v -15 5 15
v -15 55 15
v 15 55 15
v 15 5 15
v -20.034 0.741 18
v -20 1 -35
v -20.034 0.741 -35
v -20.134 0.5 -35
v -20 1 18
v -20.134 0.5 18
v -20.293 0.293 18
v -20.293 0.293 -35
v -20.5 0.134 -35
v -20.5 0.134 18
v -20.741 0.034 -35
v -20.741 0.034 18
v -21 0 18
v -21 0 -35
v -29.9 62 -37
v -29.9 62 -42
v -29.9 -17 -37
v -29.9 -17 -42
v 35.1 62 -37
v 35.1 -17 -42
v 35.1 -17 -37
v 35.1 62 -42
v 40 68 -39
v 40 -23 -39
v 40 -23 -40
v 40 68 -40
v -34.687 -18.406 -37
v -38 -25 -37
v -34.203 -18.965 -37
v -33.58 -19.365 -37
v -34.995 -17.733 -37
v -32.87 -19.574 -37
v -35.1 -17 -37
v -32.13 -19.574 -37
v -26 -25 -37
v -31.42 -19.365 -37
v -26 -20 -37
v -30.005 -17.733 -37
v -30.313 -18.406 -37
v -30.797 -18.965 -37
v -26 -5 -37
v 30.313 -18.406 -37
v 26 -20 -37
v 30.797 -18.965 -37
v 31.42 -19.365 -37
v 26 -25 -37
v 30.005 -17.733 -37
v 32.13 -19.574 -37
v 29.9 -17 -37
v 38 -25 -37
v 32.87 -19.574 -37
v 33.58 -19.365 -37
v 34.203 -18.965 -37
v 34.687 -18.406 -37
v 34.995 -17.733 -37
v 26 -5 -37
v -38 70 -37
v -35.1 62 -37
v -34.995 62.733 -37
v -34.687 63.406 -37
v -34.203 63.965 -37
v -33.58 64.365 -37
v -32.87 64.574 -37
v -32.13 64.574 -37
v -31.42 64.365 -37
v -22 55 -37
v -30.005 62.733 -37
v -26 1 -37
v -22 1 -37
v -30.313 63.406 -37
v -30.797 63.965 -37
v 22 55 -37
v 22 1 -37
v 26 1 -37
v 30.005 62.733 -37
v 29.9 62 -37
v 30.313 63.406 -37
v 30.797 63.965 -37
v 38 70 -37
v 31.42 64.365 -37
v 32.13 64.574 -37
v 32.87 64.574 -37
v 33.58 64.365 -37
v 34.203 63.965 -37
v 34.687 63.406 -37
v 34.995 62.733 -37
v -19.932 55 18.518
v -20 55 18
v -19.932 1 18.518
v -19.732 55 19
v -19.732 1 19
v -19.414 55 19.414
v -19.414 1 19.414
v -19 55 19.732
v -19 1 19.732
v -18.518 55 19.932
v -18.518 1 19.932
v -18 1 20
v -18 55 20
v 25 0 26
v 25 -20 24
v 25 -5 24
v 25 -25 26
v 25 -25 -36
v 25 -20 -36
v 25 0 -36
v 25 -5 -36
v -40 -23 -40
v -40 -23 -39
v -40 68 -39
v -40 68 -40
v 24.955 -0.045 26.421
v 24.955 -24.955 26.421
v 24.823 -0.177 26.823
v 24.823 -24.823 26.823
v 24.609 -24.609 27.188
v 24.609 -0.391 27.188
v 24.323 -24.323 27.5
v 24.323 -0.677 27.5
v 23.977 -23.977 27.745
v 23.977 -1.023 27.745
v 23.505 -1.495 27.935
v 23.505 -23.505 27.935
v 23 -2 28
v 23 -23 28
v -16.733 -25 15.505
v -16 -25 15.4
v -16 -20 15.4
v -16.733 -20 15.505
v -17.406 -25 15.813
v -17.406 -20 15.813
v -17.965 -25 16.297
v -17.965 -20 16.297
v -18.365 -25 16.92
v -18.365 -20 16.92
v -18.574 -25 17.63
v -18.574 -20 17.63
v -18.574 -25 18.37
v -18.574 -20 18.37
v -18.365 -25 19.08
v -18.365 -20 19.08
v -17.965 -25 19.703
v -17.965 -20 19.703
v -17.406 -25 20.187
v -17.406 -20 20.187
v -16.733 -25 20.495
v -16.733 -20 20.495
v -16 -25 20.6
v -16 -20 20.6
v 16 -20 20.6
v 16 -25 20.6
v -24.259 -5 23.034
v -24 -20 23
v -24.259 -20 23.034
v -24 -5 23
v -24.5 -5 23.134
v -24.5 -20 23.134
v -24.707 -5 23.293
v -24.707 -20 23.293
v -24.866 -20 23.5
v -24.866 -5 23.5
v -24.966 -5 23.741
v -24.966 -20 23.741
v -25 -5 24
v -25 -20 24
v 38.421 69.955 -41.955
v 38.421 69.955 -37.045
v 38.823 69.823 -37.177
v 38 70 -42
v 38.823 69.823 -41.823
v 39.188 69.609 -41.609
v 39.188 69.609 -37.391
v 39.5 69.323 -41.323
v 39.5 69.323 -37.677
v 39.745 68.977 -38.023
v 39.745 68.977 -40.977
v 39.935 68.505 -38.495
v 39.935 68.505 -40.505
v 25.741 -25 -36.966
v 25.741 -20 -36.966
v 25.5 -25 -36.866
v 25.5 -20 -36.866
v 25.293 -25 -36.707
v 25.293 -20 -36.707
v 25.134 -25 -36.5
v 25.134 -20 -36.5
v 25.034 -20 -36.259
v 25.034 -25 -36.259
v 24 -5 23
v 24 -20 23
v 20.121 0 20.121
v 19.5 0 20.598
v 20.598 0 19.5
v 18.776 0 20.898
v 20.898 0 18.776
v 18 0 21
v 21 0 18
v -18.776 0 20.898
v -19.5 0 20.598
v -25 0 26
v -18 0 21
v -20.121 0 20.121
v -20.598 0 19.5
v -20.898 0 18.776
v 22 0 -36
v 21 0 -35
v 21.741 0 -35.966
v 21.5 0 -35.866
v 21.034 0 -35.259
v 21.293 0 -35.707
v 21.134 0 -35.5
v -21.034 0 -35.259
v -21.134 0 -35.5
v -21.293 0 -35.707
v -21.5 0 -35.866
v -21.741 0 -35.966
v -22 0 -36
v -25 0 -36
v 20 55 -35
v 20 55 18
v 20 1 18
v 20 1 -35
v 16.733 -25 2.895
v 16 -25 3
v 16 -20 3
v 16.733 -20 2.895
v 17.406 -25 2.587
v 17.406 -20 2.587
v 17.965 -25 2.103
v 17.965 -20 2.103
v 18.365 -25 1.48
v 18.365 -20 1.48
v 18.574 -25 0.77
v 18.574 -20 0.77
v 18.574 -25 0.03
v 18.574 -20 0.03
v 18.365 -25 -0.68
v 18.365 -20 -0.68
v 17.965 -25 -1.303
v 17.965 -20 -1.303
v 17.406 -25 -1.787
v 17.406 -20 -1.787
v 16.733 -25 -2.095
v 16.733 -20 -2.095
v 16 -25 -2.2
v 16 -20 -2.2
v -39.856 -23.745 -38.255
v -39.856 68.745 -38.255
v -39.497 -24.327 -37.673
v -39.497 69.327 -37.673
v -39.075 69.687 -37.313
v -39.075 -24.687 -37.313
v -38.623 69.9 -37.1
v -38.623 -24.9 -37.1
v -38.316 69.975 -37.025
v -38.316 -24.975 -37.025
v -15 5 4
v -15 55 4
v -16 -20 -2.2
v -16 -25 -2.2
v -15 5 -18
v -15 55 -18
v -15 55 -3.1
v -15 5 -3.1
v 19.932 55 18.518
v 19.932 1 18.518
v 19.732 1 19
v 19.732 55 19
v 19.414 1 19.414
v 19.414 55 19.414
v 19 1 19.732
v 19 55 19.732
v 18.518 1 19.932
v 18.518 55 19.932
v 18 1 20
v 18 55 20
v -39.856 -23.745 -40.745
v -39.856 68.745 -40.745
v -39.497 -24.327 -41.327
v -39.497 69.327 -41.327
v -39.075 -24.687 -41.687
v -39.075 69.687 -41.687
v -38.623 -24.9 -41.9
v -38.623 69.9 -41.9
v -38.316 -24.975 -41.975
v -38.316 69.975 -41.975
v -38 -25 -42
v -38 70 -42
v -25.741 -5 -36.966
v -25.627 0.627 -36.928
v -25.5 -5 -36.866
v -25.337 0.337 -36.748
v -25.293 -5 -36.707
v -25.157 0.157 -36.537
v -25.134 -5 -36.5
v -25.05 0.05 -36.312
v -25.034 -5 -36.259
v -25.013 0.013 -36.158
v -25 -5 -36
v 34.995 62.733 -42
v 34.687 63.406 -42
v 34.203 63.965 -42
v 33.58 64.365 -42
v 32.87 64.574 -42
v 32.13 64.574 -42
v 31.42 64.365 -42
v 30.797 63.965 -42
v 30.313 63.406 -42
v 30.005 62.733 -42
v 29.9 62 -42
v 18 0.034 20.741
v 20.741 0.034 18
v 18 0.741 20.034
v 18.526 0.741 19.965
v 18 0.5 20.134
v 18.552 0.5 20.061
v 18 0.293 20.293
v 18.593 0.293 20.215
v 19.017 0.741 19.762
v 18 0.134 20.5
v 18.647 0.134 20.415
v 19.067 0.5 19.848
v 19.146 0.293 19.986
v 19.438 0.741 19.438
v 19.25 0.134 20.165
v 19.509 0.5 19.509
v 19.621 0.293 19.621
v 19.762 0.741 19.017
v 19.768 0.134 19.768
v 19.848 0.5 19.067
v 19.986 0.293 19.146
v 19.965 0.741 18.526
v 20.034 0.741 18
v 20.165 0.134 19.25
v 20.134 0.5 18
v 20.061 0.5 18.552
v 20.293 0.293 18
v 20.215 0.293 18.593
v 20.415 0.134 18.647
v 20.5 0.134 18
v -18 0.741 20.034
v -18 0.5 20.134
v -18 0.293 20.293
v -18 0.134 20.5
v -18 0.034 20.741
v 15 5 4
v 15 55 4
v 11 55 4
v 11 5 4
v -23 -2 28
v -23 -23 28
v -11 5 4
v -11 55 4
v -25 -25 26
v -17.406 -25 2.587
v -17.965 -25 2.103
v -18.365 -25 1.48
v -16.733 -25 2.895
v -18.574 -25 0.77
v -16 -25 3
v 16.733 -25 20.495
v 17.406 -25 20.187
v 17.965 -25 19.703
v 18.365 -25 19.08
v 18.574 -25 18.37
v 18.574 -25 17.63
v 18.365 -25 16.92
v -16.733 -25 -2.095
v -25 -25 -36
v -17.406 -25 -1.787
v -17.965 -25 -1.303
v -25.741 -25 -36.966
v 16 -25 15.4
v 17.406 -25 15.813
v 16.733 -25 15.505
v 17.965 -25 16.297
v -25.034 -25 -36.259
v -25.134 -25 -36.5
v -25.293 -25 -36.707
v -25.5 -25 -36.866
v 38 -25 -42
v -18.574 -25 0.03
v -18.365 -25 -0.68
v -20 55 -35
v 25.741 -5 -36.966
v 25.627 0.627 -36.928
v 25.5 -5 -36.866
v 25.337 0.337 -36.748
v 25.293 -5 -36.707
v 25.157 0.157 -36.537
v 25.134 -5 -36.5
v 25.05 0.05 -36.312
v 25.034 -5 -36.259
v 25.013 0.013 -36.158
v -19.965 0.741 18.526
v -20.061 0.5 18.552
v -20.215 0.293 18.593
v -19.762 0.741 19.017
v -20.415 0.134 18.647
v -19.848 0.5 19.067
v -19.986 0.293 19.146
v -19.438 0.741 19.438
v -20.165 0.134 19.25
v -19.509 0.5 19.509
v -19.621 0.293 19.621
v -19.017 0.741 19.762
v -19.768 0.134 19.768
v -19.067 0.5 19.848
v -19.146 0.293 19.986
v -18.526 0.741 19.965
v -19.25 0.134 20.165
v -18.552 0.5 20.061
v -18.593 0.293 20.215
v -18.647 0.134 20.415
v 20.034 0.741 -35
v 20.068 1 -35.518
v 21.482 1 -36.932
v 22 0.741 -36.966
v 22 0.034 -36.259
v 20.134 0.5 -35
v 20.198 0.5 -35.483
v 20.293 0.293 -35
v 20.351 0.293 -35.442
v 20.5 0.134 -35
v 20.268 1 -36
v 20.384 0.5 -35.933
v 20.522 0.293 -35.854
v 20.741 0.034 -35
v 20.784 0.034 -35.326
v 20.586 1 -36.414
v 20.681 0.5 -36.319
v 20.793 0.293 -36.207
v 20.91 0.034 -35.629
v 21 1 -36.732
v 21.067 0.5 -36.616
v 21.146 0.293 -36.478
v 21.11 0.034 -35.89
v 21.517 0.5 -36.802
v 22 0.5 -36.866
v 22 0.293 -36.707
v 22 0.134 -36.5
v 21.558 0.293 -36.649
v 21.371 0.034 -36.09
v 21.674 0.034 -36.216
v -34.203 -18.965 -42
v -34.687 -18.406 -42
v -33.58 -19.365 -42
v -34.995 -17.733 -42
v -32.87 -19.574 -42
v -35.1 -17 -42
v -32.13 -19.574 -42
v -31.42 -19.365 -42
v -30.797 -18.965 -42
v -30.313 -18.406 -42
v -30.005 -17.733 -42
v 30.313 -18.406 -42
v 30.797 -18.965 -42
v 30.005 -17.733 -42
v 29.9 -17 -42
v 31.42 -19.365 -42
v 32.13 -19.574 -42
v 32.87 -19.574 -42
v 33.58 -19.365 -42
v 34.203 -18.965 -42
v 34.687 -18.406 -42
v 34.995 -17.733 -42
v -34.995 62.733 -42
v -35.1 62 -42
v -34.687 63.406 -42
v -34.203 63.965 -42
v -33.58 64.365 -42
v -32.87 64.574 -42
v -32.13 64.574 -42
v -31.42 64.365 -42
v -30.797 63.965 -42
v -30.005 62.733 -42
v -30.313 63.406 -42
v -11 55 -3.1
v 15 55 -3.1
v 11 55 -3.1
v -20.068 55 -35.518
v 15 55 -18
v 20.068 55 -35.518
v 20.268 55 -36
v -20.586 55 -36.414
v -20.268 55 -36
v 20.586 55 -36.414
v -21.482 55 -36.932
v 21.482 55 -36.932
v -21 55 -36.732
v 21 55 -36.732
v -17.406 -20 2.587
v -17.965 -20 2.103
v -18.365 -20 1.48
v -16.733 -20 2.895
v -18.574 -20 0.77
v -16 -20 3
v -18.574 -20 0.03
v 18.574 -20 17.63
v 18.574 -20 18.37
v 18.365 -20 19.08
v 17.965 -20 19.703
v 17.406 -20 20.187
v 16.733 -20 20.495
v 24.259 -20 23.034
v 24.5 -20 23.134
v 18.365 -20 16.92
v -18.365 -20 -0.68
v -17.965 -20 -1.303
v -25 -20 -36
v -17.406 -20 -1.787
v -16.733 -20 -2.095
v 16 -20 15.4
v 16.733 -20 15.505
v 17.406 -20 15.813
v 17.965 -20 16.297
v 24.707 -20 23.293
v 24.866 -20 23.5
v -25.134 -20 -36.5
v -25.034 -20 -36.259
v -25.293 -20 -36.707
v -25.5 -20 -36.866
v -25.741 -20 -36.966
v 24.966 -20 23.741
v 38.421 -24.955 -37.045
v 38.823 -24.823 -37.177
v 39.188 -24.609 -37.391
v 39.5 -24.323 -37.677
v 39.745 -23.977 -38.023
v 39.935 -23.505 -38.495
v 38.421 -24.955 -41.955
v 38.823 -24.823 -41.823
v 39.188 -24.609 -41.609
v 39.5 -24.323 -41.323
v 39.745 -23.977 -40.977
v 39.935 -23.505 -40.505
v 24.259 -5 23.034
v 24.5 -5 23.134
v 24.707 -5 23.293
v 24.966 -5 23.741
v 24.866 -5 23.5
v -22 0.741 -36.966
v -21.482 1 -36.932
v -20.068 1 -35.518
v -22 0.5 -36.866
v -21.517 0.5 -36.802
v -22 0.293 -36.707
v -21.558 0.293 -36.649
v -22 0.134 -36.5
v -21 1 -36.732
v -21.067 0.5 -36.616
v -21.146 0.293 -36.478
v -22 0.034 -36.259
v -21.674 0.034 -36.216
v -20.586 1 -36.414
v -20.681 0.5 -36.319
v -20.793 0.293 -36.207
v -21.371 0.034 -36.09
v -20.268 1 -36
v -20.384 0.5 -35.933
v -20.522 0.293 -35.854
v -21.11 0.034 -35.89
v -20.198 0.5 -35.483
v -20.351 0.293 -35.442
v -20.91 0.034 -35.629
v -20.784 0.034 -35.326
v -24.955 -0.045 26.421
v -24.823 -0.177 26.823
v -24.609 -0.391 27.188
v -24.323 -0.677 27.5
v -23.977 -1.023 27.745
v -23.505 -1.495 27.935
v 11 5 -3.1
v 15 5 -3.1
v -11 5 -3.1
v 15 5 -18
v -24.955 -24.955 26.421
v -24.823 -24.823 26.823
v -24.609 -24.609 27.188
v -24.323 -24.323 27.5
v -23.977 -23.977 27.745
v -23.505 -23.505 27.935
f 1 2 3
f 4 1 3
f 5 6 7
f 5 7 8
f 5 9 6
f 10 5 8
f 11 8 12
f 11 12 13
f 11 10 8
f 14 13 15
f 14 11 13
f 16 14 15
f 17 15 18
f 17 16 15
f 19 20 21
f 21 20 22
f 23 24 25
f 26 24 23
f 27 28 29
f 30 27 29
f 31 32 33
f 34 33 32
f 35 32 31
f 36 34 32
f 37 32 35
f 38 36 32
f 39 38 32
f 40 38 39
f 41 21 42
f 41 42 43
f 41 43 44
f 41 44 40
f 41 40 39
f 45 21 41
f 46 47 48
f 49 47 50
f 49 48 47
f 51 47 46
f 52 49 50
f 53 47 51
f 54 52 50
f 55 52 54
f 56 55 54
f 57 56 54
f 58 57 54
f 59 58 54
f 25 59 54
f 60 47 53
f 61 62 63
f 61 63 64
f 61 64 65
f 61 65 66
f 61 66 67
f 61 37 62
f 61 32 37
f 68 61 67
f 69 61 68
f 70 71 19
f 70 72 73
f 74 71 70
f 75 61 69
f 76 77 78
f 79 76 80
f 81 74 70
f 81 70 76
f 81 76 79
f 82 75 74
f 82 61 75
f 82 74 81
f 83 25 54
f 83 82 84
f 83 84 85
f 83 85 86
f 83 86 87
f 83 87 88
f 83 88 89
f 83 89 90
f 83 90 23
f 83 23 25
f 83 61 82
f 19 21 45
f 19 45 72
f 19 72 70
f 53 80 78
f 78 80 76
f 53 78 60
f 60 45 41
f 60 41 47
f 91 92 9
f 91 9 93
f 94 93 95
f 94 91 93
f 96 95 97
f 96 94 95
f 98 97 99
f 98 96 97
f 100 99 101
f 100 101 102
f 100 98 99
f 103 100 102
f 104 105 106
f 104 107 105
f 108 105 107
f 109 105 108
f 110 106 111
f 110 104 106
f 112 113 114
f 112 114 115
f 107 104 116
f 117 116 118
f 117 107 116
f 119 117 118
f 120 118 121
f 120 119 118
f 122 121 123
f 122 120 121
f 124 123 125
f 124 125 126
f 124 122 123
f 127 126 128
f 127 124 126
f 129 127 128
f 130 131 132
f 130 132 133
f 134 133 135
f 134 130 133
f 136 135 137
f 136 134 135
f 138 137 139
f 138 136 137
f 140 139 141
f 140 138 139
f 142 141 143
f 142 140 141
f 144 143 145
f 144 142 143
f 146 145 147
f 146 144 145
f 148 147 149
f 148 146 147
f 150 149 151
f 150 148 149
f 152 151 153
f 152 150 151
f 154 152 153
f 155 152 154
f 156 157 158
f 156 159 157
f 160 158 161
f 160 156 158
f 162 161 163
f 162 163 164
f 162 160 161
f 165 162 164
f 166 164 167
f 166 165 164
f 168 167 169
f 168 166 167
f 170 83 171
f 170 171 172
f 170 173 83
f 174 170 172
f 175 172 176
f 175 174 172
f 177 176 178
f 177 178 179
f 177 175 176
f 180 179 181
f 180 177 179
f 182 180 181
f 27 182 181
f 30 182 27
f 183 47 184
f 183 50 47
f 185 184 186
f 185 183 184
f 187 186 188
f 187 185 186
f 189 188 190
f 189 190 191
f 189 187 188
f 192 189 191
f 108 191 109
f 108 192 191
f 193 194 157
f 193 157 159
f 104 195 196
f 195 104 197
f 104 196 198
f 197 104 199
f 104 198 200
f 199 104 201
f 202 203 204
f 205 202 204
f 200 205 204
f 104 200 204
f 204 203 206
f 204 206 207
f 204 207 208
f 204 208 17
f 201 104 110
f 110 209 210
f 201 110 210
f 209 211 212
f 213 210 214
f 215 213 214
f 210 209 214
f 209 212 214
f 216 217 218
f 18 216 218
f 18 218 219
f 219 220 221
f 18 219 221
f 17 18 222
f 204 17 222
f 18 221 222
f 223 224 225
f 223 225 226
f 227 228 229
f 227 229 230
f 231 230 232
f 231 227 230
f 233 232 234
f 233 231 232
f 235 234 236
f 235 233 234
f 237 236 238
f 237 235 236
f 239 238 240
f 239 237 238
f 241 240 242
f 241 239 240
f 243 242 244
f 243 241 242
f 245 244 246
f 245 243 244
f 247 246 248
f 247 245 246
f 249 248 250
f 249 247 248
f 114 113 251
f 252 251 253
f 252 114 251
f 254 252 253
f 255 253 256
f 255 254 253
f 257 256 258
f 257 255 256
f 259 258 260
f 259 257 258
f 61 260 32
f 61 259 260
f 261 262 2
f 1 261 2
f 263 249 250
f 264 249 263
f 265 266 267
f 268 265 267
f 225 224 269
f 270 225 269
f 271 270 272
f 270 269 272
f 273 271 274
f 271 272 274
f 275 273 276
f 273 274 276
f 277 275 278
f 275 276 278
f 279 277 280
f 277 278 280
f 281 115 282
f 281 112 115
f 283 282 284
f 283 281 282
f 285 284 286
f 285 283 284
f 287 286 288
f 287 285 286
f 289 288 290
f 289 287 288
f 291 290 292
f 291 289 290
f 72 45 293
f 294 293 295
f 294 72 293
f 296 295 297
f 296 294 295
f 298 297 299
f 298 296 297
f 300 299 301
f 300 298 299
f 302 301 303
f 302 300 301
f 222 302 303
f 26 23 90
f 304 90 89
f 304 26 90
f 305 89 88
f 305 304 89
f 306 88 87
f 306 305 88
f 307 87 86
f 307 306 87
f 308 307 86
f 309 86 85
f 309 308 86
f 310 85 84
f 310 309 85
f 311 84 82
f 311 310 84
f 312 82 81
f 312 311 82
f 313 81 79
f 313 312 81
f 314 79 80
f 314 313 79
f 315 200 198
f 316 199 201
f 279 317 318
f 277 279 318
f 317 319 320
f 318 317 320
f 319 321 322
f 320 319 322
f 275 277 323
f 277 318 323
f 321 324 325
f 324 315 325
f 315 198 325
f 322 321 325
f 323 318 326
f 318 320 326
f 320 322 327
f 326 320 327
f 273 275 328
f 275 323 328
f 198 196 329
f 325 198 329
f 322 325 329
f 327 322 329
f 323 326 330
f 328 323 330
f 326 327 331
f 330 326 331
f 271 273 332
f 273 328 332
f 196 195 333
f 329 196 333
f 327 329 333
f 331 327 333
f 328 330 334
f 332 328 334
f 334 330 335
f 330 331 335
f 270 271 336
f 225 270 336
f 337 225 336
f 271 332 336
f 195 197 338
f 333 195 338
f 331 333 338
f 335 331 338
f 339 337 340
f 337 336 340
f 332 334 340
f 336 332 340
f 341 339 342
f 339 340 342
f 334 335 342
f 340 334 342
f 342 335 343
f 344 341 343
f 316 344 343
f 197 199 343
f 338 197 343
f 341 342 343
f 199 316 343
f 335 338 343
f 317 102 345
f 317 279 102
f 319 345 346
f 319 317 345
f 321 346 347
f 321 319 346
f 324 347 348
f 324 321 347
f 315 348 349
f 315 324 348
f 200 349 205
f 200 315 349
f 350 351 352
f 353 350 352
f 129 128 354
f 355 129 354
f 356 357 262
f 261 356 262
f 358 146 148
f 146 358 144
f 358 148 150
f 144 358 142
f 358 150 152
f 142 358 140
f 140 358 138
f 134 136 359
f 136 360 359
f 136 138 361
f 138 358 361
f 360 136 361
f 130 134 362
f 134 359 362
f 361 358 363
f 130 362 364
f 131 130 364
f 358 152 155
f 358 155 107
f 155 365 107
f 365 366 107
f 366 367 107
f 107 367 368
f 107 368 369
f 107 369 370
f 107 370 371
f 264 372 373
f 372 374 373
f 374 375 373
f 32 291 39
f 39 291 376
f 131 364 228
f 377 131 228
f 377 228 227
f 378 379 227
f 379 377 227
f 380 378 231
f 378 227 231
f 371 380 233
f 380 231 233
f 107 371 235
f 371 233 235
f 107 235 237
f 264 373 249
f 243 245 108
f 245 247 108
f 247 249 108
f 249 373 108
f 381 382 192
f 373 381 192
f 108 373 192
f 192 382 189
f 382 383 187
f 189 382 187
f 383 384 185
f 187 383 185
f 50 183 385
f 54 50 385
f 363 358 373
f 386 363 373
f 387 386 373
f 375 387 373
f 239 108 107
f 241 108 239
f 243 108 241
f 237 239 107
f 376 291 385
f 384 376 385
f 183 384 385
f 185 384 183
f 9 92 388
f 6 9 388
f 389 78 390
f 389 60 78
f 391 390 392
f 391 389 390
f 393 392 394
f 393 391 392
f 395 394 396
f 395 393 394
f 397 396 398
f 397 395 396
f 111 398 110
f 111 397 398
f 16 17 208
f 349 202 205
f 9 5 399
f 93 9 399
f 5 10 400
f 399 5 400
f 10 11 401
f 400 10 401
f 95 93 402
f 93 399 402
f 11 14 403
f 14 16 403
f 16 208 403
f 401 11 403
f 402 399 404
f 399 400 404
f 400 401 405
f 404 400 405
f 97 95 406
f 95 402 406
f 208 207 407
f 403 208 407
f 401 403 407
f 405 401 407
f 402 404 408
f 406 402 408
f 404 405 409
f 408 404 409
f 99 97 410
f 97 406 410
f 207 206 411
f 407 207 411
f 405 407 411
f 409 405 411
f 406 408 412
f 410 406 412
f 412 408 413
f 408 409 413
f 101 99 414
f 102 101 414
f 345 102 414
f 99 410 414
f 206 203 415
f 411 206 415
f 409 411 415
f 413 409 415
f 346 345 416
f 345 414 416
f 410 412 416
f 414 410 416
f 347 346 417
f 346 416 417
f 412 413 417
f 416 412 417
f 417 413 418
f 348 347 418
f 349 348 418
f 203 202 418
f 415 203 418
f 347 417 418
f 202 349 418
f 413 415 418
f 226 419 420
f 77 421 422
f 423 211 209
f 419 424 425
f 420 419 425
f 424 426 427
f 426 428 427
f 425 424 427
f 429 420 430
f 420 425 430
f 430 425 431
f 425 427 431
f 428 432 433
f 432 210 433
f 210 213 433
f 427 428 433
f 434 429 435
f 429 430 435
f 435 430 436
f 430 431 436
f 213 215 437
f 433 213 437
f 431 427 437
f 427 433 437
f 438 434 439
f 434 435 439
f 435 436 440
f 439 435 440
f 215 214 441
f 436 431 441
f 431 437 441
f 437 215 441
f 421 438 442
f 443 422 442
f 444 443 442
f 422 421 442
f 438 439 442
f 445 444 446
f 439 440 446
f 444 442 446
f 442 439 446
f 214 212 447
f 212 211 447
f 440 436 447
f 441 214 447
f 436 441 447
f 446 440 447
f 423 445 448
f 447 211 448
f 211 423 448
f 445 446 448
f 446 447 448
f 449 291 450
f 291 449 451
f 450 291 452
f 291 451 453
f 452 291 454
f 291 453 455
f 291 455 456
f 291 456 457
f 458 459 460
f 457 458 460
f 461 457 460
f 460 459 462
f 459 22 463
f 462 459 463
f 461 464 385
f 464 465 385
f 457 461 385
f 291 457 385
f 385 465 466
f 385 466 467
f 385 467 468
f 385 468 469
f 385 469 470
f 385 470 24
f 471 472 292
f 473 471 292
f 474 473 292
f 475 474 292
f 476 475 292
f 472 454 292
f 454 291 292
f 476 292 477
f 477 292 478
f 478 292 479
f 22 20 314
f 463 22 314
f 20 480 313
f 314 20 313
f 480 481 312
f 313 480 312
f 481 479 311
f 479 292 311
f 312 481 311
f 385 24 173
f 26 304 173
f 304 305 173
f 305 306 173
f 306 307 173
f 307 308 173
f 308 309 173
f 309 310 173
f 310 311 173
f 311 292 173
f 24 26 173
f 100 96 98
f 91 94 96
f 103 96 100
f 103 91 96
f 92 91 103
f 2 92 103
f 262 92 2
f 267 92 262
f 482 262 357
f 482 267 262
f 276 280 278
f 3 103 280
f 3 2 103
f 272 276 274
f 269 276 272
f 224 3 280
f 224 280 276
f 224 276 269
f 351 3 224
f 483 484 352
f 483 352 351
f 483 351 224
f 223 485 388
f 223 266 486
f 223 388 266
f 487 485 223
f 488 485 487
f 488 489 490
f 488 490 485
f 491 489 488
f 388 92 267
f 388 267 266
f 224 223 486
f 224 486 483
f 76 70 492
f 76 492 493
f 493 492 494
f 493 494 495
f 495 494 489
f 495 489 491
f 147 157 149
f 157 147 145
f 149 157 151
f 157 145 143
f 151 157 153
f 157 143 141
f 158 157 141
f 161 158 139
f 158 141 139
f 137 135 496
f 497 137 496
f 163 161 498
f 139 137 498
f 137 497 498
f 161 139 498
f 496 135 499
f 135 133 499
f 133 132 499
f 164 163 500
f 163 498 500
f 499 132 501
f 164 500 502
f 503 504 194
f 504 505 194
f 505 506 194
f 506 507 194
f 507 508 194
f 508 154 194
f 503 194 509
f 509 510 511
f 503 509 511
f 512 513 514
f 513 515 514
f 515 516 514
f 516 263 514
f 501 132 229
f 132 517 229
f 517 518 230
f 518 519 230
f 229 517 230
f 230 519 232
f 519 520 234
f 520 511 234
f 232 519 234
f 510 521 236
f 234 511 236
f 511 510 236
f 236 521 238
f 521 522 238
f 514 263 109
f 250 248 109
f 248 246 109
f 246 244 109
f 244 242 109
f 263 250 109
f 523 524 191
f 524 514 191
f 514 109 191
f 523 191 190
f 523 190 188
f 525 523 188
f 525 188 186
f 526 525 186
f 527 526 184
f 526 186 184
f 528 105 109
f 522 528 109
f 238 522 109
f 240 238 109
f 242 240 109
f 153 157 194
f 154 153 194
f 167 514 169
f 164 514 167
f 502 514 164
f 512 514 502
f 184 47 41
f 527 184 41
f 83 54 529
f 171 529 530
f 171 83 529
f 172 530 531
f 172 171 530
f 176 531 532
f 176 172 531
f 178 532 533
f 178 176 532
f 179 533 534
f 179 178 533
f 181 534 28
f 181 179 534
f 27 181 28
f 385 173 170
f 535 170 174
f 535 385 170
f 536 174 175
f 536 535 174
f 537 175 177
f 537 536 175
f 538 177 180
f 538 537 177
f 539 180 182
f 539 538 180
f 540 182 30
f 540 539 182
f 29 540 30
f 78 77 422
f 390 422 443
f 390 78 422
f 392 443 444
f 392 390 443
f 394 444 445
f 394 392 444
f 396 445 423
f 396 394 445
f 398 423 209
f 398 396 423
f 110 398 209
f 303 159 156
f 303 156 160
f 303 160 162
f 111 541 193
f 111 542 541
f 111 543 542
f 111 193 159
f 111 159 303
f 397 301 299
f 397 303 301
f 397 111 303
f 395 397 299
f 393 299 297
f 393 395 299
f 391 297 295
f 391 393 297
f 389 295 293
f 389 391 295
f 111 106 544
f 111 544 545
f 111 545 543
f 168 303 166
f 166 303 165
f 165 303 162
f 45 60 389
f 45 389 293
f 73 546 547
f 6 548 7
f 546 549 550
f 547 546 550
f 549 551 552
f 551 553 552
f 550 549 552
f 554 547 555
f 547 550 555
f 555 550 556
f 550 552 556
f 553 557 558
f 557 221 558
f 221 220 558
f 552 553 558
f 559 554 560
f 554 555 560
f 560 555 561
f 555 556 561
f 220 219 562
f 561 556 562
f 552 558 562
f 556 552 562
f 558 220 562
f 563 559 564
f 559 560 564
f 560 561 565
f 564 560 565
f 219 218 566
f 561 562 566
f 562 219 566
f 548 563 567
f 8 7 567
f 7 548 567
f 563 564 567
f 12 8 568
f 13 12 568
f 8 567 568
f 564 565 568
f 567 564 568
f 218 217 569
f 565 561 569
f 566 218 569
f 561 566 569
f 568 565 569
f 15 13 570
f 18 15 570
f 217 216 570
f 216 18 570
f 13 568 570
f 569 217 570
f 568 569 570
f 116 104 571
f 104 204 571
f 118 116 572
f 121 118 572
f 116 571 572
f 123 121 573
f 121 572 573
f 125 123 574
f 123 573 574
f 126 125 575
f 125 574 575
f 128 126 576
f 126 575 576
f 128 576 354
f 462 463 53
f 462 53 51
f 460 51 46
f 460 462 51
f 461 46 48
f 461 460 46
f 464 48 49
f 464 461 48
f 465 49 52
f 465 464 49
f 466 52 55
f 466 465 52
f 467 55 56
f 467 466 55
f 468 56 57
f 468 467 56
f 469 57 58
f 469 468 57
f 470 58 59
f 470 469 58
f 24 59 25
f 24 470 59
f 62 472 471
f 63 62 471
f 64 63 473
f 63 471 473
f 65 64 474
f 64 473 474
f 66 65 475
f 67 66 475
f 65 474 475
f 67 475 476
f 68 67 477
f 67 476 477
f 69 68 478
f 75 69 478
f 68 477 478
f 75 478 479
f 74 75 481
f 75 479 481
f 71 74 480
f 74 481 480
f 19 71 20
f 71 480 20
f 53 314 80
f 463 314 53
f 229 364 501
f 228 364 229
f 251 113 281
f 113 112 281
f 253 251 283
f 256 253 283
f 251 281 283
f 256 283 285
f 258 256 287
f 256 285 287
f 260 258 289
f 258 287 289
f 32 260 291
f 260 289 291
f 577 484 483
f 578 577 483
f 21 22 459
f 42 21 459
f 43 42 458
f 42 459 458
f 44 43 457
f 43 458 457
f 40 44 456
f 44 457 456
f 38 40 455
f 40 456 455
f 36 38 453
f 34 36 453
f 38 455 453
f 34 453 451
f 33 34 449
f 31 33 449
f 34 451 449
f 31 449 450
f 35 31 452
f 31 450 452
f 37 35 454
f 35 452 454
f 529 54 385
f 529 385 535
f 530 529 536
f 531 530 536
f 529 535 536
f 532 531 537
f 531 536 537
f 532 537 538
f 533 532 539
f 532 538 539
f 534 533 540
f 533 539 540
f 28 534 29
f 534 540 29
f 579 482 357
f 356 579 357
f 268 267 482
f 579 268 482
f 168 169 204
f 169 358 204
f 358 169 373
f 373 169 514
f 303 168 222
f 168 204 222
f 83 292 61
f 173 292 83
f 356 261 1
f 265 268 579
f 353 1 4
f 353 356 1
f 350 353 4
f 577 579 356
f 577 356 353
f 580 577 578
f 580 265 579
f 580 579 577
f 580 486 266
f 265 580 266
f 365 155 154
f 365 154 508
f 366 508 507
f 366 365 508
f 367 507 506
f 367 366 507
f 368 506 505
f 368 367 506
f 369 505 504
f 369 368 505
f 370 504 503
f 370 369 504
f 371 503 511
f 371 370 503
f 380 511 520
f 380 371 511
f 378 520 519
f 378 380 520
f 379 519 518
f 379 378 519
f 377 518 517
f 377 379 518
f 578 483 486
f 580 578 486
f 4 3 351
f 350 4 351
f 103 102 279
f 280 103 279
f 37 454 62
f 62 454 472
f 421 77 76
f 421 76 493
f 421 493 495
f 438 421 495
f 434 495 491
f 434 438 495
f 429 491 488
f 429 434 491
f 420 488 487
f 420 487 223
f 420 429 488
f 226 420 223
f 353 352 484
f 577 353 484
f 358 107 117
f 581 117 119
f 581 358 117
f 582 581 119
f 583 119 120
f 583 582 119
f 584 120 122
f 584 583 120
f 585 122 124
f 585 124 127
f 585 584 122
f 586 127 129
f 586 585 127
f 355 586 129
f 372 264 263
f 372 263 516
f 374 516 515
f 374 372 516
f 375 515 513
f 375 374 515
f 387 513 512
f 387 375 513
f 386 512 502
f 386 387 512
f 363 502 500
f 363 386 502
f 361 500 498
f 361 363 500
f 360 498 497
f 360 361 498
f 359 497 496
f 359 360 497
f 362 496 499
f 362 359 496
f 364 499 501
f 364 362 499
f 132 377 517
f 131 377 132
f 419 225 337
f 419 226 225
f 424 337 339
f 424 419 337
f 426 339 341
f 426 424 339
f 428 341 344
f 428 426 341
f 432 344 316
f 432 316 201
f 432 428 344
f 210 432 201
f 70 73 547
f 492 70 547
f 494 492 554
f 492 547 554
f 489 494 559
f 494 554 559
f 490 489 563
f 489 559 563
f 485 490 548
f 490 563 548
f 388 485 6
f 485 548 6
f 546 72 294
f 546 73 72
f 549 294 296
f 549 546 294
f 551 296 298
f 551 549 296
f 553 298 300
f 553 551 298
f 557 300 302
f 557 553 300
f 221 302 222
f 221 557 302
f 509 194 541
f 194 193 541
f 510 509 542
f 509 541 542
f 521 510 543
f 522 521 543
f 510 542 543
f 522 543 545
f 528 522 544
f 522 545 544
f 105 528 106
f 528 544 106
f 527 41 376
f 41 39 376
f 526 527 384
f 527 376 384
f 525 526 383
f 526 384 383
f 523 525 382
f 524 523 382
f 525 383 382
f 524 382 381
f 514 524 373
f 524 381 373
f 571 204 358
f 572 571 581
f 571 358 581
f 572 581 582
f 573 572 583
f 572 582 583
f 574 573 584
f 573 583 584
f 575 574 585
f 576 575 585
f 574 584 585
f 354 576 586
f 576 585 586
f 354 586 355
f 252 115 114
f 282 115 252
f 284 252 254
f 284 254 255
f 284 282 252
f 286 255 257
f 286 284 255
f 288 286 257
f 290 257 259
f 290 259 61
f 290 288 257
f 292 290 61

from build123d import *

# Parameters (mm, degrees)
SKETCH_1_W           = 40
SKETCH_1_H           = 60
EXTRUDE_1_DEPTH      = 55
CUT_EXTRUDE_1_DEPTH  = 50
SKETCH_6_W           = 50
SKETCH_6_H           = 70
EXTRUDE_2_DEPTH      = 25
SKETCH_7_W           = 60
SKETCH_7_H           = 15
CUT_EXTRUDE_2_DEPTH  = 51
CUT_EXTRUDE_3_REACH  = 82
SKETCH_10_W          = 80
SKETCH_10_H          = 5
EXTRUDE_3_DEPTH      = 70
EXTRUDE_3_DEPTH_BACK = 25
CUT_EXTRUDE_4_REACH  = 72
FILLET_1_R           = 2
FILLET_2_R           = 1
FILLET_3_R           = 1


with BuildPart() as part:
    # 草图1 → 凸台-拉伸1 (new body)
    with BuildSketch(Plane(origin=(0, 0, 0), x_dir=(1, 0, 0), z_dir=(0, 1, 0))):
        with Locations((0, 10)):
            Rectangle(SKETCH_1_W, SKETCH_1_H)
    extrude(amount=EXTRUDE_1_DEPTH)

    # 草图2 → 切除-拉伸1 (cut)
    with BuildSketch(Plane(origin=(0, 55, 0), x_dir=(1, 0, 0), z_dir=(0, 1, 0))):
        Polygon((-15, 15), (-15, 3.1), (-11, 3.1), (-11, -4), (-15, -4), (-15, -15), (15, -15), (15, -4), (11, -4), (11, 3.1), (15, 3.1), (15, 15), (15, 18), (-15, 18), align=None)
    extrude(amount=-CUT_EXTRUDE_1_DEPTH, mode=Mode.SUBTRACT)

    # 草图6 → 凸台-拉伸2 (add)
    with BuildSketch(Plane(origin=(0, 0, 0), x_dir=(-1, 0, 0), z_dir=(0, -1, 0))):
        with Locations((0, 7)):
            Rectangle(SKETCH_6_W, SKETCH_6_H)
    extrude(amount=EXTRUDE_2_DEPTH)

    # 草图7 → 切除-拉伸2 (cut, through all)
    with BuildSketch(Plane(origin=(25, 0, 0), x_dir=(0, 0, -1), z_dir=(1, 0, 0))):
        with Locations((7, -12.5)):
            Rectangle(SKETCH_7_W, SKETCH_7_H)
    extrude(amount=-CUT_EXTRUDE_2_DEPTH, mode=Mode.SUBTRACT)

    # 草图8 → 切除-拉伸3 (cut, up to next)
    with BuildSketch(Plane.XZ.offset(25), mode=Mode.PRIVATE) as cut_extrude_3_sk1:
        with BuildLine():
            Line((-16, 20.6), (16, 20.6))
            ThreePointArc((16, 20.6), (18.6, 18), (16, 15.4))
            Line((16, 15.4), (-16, 15.4))
            ThreePointArc((-16, 15.4), (-18.6, 18), (-16, 20.6))
        make_face()
    cut_extrude_3_tool1 = extrude(cut_extrude_3_sk1.sketch, amount=-CUT_EXTRUDE_3_REACH, mode=Mode.PRIVATE) & part.part
    add(cut_extrude_3_tool1.solids().sort_by_distance((0, -25, 18))[0], mode=Mode.SUBTRACT)
    # 草图8 → 切除-拉伸3 (cut, up to next)
    with BuildSketch(Plane.XZ.offset(25), mode=Mode.PRIVATE) as cut_extrude_3_sk2:
        with BuildLine():
            Line((-16, 3), (16, 3))
            ThreePointArc((16, 3), (18.6, 0.4), (16, -2.2))
            Line((16, -2.2), (-16, -2.2))
            ThreePointArc((-16, -2.2), (-18.6, 0.4), (-16, 3))
        make_face()
    cut_extrude_3_tool2 = extrude(cut_extrude_3_sk2.sketch, amount=-CUT_EXTRUDE_3_REACH, mode=Mode.PRIVATE) & part.part
    add(cut_extrude_3_tool2.solids().sort_by_distance((0, -25, 0.4))[0], mode=Mode.SUBTRACT)

    # 草图10 → 凸台-拉伸3 (add, two sides)
    with BuildSketch(Plane(origin=(0, 0, 0), x_dir=(1, 0, 0), z_dir=(0, 1, 0))) as extrude_3_sk:
        with Locations((0, 39.5)):
            Rectangle(SKETCH_10_W, SKETCH_10_H)
    extrude(amount=EXTRUDE_3_DEPTH)
    extrude(extrude_3_sk.sketch, amount=-EXTRUDE_3_DEPTH_BACK)

    # 草图11 → 切除-拉伸4 (cut, up to next)
    with BuildSketch(Plane(origin=(0, 0, -42), x_dir=(-1, 0, 0), z_dir=(0, 0, -1)), mode=Mode.PRIVATE) as cut_extrude_4_sk1:
        with BuildLine():
            Line((-29.9, 62), (-29.9, -17))
            ThreePointArc((-29.9, -17), (-32.5, -19.6), (-35.1, -17))
            Line((-35.1, -17), (-35.1, 62))
            ThreePointArc((-35.1, 62), (-32.5, 64.6), (-29.9, 62))
        make_face()
    cut_extrude_4_tool1 = extrude(cut_extrude_4_sk1.sketch, amount=-CUT_EXTRUDE_4_REACH, mode=Mode.PRIVATE) & part.part
    add(cut_extrude_4_tool1.solids().sort_by_distance((32.5, 22.5, -42))[0], mode=Mode.SUBTRACT)
    # 草图11 → 切除-拉伸4 (cut, up to next)
    with BuildSketch(Plane(origin=(0, 0, -42), x_dir=(-1, 0, 0), z_dir=(0, 0, -1)), mode=Mode.PRIVATE) as cut_extrude_4_sk2:
        with BuildLine():
            Line((29.9, 62), (29.9, -17))
            ThreePointArc((29.9, -17), (32.5, -19.6), (35.1, -17))
            Line((35.1, -17), (35.1, 62))
            ThreePointArc((35.1, 62), (32.5, 64.6), (29.9, 62))
        make_face()
    cut_extrude_4_tool2 = extrude(cut_extrude_4_sk2.sketch, amount=-CUT_EXTRUDE_4_REACH, mode=Mode.PRIVATE) & part.part
    add(cut_extrude_4_tool2.solids().sort_by_distance((-32.5, 22.5, -42))[0], mode=Mode.SUBTRACT)

    # 圆角1
    fillet_1_edges = [part.edges().sort_by_distance(p)[0] for p in [
        (-40, 22.5, -42),
        (40, 22.5, -37),
        (20, 27.5, -37),
        (-20, 27.5, -37),
        (-40, 22.5, -37),
        (-40, -25, -39.5),
        (40, 22.5, -42),
        (40, -25, -39.5),
        (-40, 70, -39.5),
        (40, 70, -39.5),
        (0, 0, 28),
        (25, -12.5, 28),
        (-25, -12.5, 28),
        (0, -25, 28),
        (20, 27.5, 20),
        (-20, 27.5, 20),
    ]]
    fillet(fillet_1_edges, radius=FILLET_1_R)

    # 圆角2
    fillet_2_edges = [part.edges().sort_by_distance(p)[0] for p in [
        (-23.5, 0, -37),
        (23.5, 0, -37),
        (20, 0, -8.5),
        (0, 0, 20),
        (-20, 0, -8.5),
        (-20.585786438, 0, -36.414213562),
        (20.585786438, 0, -36.414213562),
        (19.414213562, 0, 19.414213562),
        (-19.414213562, 0, 19.414213562),
    ]]
    fillet(fillet_2_edges, radius=FILLET_2_R)

    # 圆角3
    fillet_3_edges = [part.edges().sort_by_distance(p)[0] for p in [
        (25, -12.5, 23),
        (-25, -12.5, 23),
        (-25, -22.5, -37),
        (-25, -2.5, -37),
        (25, -22.5, -37),
        (25, -2.5, -37),
    ]]
    fillet(fillet_3_edges, radius=FILLET_3_R)


solid = part.part
